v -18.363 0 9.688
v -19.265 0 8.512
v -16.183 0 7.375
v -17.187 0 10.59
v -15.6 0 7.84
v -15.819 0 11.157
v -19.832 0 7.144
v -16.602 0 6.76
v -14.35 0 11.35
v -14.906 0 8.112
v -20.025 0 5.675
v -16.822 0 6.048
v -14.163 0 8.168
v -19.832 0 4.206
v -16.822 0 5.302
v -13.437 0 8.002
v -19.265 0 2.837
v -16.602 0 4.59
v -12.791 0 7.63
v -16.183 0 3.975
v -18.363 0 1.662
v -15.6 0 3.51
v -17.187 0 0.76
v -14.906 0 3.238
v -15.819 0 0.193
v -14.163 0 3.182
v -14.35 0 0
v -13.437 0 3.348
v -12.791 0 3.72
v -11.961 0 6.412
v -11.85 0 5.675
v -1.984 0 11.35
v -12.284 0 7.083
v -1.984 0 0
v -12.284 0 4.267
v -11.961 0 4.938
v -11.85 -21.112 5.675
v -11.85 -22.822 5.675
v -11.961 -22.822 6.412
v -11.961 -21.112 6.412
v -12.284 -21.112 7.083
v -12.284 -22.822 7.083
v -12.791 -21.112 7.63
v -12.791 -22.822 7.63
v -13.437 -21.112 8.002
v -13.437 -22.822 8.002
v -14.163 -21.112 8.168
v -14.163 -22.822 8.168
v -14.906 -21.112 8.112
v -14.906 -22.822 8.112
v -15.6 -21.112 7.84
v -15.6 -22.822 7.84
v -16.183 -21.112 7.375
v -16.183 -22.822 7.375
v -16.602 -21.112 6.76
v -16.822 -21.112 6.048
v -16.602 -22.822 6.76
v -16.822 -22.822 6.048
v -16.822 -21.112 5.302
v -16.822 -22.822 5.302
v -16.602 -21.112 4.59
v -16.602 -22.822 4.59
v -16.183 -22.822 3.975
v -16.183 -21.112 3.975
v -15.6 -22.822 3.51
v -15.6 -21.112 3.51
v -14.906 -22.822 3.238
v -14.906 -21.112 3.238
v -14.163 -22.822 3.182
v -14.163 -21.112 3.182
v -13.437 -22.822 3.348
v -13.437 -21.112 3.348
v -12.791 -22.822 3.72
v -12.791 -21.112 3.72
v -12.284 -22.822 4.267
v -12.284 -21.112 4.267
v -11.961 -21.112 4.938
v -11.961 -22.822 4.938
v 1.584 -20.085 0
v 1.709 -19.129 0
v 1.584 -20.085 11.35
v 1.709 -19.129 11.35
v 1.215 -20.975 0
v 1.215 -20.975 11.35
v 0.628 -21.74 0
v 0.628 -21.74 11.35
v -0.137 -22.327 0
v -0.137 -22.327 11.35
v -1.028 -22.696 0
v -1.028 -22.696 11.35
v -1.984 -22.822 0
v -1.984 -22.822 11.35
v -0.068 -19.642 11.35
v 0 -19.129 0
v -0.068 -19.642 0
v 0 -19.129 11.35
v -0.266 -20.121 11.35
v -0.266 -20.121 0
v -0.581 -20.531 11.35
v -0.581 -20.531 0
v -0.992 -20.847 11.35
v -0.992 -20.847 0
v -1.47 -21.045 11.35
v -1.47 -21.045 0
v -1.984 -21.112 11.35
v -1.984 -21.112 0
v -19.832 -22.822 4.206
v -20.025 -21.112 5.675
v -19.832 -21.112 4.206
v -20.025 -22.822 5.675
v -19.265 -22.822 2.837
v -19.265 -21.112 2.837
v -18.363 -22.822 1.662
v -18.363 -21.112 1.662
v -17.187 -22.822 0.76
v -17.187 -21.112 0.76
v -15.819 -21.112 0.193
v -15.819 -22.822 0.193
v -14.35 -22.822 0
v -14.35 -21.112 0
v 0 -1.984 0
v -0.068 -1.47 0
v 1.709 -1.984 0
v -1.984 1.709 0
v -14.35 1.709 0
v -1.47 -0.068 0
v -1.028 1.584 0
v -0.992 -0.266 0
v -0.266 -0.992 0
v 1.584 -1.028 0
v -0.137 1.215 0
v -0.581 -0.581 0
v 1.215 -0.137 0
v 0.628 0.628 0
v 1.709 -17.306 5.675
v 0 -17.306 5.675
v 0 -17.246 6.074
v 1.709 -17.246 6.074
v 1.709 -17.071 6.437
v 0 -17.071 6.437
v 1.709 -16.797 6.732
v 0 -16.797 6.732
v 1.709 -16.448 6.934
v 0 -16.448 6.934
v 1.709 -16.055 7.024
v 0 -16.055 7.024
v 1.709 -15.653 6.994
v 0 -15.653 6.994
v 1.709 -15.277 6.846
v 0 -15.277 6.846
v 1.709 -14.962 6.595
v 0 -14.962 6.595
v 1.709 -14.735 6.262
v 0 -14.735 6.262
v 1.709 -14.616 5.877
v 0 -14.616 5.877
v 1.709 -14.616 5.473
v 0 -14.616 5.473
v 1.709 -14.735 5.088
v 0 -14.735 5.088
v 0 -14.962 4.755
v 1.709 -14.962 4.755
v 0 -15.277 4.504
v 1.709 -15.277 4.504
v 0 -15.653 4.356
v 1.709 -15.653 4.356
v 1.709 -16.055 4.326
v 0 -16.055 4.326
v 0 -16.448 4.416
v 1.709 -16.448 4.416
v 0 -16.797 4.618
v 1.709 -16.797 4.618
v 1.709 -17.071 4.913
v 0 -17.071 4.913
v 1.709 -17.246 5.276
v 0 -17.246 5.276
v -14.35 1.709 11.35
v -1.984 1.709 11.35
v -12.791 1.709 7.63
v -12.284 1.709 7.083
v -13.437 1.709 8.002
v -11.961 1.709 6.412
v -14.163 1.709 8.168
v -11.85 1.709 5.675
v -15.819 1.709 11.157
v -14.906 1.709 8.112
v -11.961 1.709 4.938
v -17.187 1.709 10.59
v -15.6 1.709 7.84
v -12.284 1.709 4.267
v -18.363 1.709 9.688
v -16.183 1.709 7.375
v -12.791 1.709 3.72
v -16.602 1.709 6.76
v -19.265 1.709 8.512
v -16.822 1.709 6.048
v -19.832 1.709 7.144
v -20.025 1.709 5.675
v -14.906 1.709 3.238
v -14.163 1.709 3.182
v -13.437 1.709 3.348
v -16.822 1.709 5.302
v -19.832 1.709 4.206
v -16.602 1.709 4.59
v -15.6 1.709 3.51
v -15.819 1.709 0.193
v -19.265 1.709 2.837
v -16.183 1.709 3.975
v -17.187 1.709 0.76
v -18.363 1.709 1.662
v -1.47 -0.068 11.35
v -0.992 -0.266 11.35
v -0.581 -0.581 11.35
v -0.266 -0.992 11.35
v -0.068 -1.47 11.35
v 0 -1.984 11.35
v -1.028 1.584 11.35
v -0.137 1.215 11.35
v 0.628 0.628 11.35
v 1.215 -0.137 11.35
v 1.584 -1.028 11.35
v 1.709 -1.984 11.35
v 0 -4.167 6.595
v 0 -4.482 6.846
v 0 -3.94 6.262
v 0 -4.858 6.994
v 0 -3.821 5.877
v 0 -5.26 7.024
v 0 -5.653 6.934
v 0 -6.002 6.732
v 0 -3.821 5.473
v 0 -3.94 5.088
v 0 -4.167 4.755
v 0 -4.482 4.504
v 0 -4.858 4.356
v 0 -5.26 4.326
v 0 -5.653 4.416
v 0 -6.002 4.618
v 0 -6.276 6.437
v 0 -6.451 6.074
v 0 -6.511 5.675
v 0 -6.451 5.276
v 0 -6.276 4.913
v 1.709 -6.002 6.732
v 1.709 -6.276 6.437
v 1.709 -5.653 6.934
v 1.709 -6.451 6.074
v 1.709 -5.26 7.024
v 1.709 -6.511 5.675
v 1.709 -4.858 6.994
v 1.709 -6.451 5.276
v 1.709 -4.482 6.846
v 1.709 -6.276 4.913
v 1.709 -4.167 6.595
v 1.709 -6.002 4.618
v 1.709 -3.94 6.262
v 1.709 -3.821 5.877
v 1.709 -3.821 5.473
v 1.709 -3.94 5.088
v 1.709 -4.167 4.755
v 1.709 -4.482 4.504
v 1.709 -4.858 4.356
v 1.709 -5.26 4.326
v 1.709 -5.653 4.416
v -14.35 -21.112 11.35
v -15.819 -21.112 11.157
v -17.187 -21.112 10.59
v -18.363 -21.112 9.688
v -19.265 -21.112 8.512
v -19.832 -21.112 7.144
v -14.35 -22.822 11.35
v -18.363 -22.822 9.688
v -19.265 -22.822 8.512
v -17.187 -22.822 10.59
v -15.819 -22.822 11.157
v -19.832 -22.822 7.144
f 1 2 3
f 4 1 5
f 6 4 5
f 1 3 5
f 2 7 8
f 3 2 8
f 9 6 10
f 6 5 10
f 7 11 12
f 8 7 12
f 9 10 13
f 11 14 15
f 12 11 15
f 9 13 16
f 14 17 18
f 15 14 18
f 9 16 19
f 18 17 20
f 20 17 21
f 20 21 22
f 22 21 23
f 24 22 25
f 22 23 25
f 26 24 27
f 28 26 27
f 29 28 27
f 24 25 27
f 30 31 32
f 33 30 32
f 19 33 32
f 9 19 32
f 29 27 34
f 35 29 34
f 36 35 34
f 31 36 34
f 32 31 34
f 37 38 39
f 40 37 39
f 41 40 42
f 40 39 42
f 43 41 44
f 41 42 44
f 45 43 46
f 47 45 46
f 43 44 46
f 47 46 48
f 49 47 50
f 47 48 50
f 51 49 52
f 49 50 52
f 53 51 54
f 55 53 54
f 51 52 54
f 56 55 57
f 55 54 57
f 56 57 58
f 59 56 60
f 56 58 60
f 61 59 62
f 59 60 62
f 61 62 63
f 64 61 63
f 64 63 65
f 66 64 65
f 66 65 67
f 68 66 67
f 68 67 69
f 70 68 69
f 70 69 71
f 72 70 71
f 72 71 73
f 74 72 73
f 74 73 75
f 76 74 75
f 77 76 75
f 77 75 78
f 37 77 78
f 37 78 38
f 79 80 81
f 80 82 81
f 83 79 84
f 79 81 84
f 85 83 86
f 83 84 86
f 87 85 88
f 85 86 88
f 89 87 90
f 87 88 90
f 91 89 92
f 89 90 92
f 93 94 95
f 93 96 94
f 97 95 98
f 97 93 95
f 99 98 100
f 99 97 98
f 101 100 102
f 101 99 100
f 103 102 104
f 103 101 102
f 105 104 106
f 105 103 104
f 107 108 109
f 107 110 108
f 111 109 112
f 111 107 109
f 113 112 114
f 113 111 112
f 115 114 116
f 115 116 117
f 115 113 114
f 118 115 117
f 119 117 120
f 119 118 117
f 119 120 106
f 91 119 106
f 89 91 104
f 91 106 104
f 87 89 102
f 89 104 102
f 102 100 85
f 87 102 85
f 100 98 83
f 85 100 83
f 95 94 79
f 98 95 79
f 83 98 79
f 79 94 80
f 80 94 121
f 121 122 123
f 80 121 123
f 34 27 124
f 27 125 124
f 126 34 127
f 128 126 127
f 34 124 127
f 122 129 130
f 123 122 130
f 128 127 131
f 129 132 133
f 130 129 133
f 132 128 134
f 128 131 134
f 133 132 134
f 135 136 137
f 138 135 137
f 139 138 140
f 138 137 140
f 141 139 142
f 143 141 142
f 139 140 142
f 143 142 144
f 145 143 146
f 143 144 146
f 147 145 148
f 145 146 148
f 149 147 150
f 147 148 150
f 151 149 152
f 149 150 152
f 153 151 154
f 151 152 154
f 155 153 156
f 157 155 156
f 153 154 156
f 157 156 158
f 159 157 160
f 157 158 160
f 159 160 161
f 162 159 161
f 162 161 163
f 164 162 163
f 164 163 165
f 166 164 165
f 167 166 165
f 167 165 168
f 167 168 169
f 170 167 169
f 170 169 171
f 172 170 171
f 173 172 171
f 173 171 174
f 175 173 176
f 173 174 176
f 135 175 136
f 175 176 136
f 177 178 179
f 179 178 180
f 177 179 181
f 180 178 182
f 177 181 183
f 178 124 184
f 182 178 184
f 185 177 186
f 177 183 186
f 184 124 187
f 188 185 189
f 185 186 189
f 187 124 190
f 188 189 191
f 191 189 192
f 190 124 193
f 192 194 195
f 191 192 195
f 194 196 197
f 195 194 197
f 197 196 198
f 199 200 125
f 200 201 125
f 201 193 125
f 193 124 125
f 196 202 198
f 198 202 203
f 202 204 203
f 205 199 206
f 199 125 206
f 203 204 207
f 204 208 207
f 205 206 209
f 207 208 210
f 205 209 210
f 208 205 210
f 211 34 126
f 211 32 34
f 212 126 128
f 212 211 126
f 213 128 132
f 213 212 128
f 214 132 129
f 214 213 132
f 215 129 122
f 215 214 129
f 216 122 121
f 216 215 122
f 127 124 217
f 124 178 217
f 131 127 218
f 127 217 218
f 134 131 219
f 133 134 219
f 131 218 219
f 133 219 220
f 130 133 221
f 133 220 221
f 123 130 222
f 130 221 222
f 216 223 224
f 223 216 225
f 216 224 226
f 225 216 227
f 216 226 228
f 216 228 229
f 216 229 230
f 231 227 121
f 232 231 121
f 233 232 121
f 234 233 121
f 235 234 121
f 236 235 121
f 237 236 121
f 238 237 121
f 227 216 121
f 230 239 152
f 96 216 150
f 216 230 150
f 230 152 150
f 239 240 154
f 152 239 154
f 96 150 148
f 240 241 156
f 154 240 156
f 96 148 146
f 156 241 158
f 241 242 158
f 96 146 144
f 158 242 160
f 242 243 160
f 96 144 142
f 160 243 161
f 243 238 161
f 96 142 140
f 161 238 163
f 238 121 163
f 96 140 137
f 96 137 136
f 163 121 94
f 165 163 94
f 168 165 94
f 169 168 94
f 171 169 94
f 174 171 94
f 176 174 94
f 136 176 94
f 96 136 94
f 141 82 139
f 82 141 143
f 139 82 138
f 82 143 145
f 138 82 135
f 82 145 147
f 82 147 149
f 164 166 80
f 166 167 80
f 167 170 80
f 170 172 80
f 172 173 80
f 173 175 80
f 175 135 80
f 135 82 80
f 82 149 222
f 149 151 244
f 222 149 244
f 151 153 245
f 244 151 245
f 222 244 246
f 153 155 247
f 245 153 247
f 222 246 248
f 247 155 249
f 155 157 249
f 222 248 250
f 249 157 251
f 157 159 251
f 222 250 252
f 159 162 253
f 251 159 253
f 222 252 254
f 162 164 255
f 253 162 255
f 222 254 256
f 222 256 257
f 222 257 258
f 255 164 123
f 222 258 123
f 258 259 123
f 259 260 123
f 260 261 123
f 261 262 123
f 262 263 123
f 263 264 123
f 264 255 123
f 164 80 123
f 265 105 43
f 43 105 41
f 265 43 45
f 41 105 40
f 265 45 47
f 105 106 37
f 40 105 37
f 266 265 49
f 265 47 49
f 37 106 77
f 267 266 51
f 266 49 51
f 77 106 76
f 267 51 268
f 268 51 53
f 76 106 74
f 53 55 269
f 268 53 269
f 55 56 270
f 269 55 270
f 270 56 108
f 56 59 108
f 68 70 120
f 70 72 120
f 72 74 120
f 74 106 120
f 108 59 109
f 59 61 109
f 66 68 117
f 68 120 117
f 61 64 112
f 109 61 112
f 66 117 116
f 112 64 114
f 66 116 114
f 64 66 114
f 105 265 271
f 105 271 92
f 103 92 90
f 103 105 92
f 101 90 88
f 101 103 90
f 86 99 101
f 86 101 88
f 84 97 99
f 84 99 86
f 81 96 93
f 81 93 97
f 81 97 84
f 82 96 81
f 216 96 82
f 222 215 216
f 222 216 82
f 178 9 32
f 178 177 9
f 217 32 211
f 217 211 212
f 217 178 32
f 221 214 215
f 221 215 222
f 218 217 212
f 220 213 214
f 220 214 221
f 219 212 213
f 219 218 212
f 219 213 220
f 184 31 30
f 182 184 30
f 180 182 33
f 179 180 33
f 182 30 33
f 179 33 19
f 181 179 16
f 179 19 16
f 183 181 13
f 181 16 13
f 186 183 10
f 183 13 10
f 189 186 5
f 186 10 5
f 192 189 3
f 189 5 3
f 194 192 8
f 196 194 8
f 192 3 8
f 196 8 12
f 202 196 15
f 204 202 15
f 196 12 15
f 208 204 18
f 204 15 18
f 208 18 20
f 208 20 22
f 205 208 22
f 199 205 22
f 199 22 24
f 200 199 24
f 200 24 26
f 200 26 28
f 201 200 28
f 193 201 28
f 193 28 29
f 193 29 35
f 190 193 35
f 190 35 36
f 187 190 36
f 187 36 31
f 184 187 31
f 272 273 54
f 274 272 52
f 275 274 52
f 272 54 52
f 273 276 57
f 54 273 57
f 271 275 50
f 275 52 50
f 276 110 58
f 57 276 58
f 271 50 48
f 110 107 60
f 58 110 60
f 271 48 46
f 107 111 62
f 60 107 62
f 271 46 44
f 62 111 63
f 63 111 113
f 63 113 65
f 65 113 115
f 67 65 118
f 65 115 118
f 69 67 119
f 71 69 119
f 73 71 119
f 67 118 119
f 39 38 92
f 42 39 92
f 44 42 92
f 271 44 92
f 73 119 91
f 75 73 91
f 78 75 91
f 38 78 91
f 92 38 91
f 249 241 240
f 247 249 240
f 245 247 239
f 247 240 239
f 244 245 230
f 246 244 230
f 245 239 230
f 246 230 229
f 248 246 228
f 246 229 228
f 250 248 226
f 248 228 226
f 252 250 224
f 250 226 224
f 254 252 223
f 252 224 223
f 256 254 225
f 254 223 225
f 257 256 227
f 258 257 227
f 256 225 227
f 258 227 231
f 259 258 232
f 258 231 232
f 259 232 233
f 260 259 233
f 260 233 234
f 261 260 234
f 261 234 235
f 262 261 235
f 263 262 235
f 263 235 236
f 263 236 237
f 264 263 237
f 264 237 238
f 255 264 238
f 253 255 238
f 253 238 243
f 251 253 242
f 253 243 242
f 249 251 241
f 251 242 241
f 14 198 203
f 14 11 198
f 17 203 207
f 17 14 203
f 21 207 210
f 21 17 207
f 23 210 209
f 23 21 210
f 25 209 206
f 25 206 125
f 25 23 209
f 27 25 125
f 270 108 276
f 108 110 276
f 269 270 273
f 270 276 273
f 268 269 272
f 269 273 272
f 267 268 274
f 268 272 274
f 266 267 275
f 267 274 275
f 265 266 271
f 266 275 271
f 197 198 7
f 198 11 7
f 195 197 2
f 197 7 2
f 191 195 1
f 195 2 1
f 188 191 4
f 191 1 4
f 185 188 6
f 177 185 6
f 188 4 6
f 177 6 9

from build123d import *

# Parameters (mm, degrees)
F1_DEPTH = 11.34999
F2_R     = 5.674985
F3_R     = 2.5
F4_DEPTH = 24.53132
F5_R     = 3.69316
F6_R     = 1.98374
F7_R     = 1.35255
F8_DEPTH = 1.70942


# Not quite as in the source:
# - a fillet or chamfer is up to 0.001 mm smaller than in the source, because OpenCascade refuses the exact size


with BuildPart() as f1:
    # F0 (on Top) → F1 (new body)
    with BuildSketch(Plane.XY):
        Polygon((-20.0249917, 0), (0, 0), (0, -21.11248), (-20.0249917, -21.11248), (-20.0249917, -22.8219), (1.70942, -22.8219), (1.70942, 1.70942), (-20.0249917, 1.70942), align=None)
    extrude(amount=F1_DEPTH)

    # F2 (radius 5.674995 in the source; OpenCascade refuses exactly that, so slightly less here)
    f2_edges = [f1.edges().sort_by_distance(p)[0] for p in [
        (-20.024992, -21.96719, 11.34999),
        (-20.024992, -21.96719, 0),
        (-20.024992, 0.85471, 11.34999),
        (-20.024992, 0.85471, 0),
    ]]
    fillet(f2_edges, radius=F2_R)

    # F3 (on face) → F4 (cut, through all)
    with BuildSketch(Plane.XZ.offset(22.8219)):
        with Locations((-14.3499967, 5.674995)):
            Circle(F3_R)
    extrude(amount=-F4_DEPTH, mode=Mode.SUBTRACT)

    # F5
    f5_edges = [f1.edges().sort_by_distance(p)[0] for p in [
        (1.70942, -22.8219, 5.674995),
        (1.70942, 1.70942, 5.674995),
    ]]
    fillet(f5_edges, radius=F5_R)

    # F6
    f6_edges = [f1.edges().sort_by_distance(p)[0] for p in [
        (0, -21.11248, 5.674995),
        (0, 0, 5.674995),
    ]]
    fillet(f6_edges, radius=F6_R)

    # F7 (on face) → F8 (cut, through all)
    with BuildSketch(Plane(origin=(0, 0, 0), x_dir=(0, -1, 0), z_dir=(-1, 0, 0))):
        with Locations((15.95374, 5.674995)):
            Circle(F7_R)
        with Locations((5.15874, 5.674995)):
            Circle(F7_R)
    extrude(amount=-F8_DEPTH, mode=Mode.SUBTRACT)


solid = f1.part
